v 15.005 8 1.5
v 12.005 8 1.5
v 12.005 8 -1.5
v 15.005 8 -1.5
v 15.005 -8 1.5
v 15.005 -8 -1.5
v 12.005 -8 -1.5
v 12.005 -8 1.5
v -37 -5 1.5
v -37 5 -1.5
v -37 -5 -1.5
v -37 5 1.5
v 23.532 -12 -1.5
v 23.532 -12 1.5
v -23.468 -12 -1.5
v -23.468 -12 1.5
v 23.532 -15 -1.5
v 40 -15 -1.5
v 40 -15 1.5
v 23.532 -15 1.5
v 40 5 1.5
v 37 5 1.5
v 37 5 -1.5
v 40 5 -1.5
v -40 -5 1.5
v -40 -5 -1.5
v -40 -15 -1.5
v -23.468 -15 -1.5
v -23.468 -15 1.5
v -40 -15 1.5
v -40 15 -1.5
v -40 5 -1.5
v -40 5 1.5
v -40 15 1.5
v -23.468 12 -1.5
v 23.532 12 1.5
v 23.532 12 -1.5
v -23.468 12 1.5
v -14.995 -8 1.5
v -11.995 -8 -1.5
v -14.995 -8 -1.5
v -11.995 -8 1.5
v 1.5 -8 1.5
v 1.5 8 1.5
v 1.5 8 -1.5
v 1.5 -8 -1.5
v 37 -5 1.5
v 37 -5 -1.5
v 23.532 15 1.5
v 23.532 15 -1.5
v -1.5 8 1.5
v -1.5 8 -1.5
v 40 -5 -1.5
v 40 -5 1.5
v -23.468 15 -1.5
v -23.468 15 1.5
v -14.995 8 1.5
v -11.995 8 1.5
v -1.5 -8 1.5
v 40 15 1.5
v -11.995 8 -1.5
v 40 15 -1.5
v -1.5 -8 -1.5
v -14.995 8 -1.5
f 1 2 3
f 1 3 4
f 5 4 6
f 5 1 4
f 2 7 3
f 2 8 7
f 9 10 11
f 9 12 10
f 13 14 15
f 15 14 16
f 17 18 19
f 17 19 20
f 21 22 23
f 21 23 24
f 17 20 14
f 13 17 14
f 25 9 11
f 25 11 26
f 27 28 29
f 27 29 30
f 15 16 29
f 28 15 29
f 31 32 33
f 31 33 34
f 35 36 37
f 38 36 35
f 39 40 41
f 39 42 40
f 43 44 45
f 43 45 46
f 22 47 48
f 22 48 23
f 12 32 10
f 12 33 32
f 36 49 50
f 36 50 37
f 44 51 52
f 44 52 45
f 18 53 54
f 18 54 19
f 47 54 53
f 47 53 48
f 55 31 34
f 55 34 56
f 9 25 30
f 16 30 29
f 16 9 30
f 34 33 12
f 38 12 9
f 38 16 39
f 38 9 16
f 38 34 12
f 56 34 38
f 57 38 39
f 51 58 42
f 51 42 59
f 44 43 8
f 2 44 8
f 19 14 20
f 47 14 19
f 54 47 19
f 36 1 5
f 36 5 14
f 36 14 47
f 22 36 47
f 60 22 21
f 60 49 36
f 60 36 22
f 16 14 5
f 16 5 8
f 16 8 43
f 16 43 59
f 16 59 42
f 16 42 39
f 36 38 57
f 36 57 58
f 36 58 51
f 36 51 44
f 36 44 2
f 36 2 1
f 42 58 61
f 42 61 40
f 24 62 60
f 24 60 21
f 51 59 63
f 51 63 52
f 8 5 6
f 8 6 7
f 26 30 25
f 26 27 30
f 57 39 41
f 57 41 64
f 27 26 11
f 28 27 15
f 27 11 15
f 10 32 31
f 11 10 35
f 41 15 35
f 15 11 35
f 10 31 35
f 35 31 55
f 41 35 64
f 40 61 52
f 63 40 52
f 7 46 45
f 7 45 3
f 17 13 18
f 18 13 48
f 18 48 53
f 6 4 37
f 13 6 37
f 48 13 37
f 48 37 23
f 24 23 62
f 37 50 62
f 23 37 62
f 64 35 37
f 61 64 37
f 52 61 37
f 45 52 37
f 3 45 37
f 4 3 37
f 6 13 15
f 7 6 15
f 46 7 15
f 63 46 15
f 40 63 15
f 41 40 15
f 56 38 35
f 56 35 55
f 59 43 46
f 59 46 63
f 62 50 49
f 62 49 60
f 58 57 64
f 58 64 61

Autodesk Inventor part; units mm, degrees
ref_plane "YZ Plane" through (0, 0, 0) normal (1, 0, 0) x (0, 1, 0)
ref_plane "XZ Plane" through (0, 0, 0) normal (0, 1, 0) x (-1, 0, 0)
ref_plane "XY Plane" through (0, 0, 0) normal (0, 0, 1) x (1, 0, 0)
sketch "Sketch1" plane through (0, 0, 0) normal (0, 0, 1) x (1, 0, 0)
  line L0 (-40, 15) -> (40, 15)
  line L1 (40, 15) -> (40, -15)
  line L2 (40, -15) -> (-40, -15)
  line L3 (-40, -15) -> (-40, 15)
  line L4 (-40, 15) -> (40, -15) construction
  line L5 (40, 15) -> (-40, -15) construction
  point P0 (0, 0)
  dimension "d0" = 80
  dimension "d1" = 30
extrude "Extrusion1" add sketch "Sketch1" along normal mid plane 3
sketch "Sketch3" plane through (0, 0, 1.5) normal (0, 0, 1) x (1, 0, 0)
  line L0 (23.5315, 18) -> (23.5315, 15) projected
  line L1 (-23.4685, 18) -> (-23.4685, 15) projected
  line L2 (-23.4685, 15) -> (23.5315, 15)
  line L3 (23.5315, 15) -> (23.5315, 12)
  line L4 (23.5315, 12) -> (-23.4685, 12)
  line L5 (-23.4685, 12) -> (-23.4685, 15)
  line L6 (-40, 15) -> (-40, -15) projected
  line L7 (-40, 5) -> (-37, 5)
  line L8 (-37, 5) -> (-37, -5)
  line L9 (-37, -5) -> (-40, -5)
  line L10 (-40, -5) -> (-40, 5)
  line L11 (40, -15) -> (40, 15) projected
  line L12 (40, -5) -> (37, -5)
  line L13 (37, -5) -> (37, 5)
  line L14 (37, 5) -> (40, 5)
  line L15 (40, 5) -> (40, -5)
  line L16 (-40, -15) -> (40, -15) projected
  line L17 (40, 15) -> (-40, 15) projected
  line L18 (-23.4685, -15) -> (23.5315, -15)
  line L19 (23.5315, -15) -> (23.5315, -12)
  line L20 (23.5315, -12) -> (-23.4685, -12)
  line L21 (-23.4685, -12) -> (-23.4685, -15)
  line L22 (-14.9948, 8) -> (-11.9948, 8)
  line L23 (-11.9948, 8) -> (-11.9948, -8)
  line L24 (-11.9948, -8) -> (-14.9948, -8)
  line L25 (-14.9948, -8) -> (-14.9948, 8)
  line L26 (1.5, 8) -> (1.5, -8)
  line L27 (1.5, -8) -> (-1.5, -8)
  line L28 (-1.5, -8) -> (-1.5, 8)
  line L29 (-1.5, 8) -> (1.5, 8)
  line L30 (12.0052, 8) -> (15.0052, 8)
  line L31 (15.0052, 8) -> (15.0052, -8)
  line L32 (15.0052, -8) -> (12.0052, -8)
  line L33 (12.0052, -8) -> (12.0052, 8)
  dimension "d27" = 3
  dimension "d28" = 3
  dimension "d29" = 3
  dimension "d30" = 30
  dimension "d31" = 10
  dimension "d32" = 10
  dimension "d41" = 3
extrude "Extrusion3" cut sketch "Sketch3" against normal blind 3 contours L2 L3 L4 L5 | L7 L8 L9 L6 | L11 L12 L13 L14 | L21 L20 L19 L16 | L22 L23 L24 L25 | L26 L27 L28 L29 | L30 L31 L32 L33
equation "\"d31\" = 0.333333 * d30"
equation "\"d32\" = d31"
properties part number "Camera-Holder_Bearing-Side"
